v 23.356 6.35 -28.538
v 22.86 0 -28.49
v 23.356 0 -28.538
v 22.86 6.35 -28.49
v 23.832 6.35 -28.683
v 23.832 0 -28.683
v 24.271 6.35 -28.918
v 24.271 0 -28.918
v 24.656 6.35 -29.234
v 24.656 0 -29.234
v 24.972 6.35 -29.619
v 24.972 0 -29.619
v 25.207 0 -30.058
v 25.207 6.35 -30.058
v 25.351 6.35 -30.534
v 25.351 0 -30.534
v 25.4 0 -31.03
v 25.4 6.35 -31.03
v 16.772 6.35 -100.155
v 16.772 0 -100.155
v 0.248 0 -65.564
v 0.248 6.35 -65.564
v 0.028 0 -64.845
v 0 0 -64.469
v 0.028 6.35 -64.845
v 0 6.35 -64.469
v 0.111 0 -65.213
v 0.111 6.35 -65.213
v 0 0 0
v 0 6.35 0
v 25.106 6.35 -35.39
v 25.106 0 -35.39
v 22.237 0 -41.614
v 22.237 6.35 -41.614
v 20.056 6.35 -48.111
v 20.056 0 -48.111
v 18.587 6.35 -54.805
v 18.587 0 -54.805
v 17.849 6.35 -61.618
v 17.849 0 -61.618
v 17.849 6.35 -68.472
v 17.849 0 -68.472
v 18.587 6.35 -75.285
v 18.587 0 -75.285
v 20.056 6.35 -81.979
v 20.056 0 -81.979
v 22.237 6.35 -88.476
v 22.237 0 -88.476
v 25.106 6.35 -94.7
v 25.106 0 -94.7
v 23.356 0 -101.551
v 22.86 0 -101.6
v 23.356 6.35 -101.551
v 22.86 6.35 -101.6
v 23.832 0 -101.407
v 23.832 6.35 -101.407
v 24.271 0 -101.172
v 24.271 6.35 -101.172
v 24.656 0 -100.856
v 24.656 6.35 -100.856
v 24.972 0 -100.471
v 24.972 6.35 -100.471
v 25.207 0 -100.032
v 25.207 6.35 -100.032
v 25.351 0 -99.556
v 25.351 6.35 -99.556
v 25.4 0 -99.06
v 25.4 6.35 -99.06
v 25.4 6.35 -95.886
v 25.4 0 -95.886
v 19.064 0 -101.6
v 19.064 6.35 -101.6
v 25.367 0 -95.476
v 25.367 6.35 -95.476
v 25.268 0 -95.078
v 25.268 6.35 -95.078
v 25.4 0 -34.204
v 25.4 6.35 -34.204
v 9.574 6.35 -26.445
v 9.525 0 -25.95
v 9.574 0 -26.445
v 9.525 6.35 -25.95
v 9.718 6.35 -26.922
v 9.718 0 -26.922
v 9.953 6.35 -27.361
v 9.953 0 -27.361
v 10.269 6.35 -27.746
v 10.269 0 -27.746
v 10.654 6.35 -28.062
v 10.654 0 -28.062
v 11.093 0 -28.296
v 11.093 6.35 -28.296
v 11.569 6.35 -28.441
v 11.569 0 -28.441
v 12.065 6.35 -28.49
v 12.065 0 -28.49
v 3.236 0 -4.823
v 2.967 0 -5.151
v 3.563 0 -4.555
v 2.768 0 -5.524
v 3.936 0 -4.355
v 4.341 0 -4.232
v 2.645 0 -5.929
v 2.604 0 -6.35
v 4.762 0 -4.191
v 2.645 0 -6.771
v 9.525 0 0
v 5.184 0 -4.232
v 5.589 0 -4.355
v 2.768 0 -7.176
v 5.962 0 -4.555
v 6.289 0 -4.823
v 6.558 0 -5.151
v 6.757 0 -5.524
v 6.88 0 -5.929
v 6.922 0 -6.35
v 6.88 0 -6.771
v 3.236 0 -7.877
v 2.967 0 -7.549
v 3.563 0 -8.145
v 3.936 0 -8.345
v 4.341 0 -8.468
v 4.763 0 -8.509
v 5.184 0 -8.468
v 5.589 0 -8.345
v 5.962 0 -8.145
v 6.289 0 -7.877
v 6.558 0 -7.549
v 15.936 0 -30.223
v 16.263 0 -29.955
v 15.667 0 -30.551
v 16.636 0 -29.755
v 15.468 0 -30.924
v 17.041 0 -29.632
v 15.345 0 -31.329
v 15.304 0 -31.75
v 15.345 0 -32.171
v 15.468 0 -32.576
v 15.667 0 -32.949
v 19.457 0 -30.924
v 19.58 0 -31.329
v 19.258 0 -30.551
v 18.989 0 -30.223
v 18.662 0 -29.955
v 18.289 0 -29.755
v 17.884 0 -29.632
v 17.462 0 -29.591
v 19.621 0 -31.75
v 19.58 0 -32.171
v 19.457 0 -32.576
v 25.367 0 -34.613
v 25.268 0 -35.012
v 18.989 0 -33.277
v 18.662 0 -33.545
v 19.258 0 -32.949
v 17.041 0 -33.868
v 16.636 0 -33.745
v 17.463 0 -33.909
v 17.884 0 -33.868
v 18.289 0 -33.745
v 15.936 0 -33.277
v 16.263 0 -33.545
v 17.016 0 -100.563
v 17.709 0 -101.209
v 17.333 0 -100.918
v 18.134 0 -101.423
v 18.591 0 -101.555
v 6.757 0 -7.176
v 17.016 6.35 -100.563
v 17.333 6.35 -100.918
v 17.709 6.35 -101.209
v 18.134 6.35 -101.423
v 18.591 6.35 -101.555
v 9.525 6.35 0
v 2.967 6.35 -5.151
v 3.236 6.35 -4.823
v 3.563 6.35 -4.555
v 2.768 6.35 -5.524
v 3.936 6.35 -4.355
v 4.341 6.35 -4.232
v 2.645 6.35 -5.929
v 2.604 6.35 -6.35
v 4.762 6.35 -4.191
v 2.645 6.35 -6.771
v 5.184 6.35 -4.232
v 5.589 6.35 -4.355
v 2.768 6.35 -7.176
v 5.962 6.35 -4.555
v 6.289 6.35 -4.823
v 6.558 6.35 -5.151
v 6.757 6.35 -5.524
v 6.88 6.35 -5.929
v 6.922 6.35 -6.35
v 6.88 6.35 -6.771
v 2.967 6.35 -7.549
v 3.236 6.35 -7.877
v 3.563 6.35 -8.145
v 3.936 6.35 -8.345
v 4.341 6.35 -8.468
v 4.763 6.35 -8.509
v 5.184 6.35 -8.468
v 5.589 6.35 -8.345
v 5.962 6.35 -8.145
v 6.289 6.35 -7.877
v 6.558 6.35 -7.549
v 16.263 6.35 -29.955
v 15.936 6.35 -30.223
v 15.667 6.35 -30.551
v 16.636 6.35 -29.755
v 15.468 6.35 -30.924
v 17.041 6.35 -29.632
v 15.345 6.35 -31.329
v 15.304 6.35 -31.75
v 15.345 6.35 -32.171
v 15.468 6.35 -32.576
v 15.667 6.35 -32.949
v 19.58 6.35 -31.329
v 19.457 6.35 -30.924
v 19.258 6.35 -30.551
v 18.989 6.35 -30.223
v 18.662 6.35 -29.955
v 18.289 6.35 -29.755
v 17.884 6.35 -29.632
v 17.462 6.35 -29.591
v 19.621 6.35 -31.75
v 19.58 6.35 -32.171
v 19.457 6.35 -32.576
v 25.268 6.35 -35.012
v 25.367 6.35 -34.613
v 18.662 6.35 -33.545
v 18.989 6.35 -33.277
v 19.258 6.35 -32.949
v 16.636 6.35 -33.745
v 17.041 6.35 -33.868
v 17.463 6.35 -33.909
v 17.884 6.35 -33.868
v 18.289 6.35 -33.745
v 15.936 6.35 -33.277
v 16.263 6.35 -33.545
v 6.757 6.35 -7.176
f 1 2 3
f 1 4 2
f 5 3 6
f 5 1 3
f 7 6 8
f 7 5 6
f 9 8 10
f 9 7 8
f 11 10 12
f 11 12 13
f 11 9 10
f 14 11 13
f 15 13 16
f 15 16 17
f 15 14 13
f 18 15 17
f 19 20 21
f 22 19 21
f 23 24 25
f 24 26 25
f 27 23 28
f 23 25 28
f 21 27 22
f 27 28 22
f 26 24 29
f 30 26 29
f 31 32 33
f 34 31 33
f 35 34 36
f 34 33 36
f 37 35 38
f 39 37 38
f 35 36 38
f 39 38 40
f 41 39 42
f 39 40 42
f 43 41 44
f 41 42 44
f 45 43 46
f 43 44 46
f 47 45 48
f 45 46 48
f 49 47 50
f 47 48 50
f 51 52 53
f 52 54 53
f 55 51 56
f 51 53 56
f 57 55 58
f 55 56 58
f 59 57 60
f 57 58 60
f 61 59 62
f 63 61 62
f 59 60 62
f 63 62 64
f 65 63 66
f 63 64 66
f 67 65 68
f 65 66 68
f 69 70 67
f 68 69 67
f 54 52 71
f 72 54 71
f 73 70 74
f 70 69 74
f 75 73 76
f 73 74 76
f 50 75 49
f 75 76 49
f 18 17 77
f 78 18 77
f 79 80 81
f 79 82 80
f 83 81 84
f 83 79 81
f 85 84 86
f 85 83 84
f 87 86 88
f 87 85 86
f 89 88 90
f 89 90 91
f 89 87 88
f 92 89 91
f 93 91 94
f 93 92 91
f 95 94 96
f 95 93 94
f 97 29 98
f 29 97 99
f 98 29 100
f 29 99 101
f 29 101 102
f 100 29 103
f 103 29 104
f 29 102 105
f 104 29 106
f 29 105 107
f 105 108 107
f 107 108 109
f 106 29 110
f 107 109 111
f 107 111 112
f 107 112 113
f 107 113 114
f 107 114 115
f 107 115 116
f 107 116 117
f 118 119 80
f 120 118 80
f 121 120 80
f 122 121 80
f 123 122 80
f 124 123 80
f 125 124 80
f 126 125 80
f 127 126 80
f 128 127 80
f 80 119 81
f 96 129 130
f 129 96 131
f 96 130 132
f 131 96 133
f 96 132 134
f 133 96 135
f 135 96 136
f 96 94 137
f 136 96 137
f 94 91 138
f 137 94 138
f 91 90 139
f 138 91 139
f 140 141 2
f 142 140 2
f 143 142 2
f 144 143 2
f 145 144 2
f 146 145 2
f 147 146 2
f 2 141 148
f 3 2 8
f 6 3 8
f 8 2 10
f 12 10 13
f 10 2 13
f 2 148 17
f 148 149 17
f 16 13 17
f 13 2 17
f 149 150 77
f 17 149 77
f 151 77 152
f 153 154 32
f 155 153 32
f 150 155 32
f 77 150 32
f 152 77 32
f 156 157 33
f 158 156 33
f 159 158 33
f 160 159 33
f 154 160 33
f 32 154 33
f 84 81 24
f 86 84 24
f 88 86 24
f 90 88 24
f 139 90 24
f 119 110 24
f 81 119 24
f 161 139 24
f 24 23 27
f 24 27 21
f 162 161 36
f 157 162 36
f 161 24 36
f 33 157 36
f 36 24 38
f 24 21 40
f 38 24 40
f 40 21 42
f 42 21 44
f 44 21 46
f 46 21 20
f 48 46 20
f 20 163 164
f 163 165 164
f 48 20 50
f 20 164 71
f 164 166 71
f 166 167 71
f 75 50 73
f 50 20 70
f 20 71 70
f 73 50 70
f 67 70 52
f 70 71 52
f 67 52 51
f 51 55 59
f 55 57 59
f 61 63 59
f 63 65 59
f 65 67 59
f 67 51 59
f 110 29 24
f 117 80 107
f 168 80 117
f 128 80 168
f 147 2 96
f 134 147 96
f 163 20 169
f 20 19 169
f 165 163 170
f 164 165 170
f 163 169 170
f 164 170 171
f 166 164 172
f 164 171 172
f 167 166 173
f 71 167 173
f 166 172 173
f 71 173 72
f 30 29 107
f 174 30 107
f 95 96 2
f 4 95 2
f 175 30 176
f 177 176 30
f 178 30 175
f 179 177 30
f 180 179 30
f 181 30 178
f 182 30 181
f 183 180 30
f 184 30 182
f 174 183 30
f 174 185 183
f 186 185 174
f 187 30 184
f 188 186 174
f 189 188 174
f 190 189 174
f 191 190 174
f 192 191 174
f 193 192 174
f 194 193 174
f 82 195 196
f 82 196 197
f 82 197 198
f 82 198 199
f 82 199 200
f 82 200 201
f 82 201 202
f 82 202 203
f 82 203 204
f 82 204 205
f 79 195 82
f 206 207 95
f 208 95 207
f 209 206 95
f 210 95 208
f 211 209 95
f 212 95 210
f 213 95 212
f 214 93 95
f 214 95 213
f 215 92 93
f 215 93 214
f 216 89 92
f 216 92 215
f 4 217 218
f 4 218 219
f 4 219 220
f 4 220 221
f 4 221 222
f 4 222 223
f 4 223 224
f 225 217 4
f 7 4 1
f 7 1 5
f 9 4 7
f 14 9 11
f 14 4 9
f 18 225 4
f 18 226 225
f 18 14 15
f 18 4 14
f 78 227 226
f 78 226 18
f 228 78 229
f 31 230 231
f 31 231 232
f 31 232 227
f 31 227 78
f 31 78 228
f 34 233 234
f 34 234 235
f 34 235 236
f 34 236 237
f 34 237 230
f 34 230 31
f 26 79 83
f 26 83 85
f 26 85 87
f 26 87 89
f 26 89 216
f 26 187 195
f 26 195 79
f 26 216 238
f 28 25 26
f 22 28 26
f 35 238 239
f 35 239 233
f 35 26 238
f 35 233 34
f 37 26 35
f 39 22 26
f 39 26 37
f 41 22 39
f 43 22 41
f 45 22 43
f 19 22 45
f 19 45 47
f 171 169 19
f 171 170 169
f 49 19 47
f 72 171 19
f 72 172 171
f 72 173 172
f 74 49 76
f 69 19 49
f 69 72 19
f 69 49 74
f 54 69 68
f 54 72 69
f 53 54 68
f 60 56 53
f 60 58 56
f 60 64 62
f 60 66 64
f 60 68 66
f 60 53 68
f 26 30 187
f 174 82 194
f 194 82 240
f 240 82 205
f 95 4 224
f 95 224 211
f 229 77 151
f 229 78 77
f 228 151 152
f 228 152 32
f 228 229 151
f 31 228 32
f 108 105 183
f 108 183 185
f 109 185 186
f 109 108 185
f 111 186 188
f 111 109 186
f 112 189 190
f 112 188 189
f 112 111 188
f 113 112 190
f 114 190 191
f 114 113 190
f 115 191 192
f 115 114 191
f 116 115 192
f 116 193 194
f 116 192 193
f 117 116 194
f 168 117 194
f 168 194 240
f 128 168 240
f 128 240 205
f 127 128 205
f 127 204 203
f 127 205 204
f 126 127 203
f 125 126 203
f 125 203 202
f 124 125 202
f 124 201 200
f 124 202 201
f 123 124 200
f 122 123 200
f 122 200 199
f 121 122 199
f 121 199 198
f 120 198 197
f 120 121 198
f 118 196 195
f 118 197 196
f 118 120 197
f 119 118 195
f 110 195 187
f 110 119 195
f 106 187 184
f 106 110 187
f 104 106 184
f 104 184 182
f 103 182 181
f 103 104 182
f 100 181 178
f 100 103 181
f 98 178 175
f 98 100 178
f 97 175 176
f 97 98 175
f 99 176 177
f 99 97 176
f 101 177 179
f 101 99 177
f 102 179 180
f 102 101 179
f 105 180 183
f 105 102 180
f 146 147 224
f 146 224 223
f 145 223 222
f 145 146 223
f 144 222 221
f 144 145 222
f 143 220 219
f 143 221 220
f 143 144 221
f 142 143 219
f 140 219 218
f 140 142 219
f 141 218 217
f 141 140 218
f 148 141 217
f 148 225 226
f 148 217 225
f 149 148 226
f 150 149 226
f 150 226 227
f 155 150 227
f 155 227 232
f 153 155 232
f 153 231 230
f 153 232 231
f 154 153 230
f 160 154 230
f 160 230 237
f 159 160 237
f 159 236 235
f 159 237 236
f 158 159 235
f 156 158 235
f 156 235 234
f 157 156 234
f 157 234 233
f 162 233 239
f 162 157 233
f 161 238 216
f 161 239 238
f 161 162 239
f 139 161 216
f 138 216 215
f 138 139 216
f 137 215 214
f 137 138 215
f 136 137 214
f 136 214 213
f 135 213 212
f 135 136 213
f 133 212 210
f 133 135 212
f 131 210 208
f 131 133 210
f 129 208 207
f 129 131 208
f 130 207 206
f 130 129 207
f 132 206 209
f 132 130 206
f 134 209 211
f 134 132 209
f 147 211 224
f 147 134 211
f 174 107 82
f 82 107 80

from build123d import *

# Parameters (mm, degrees)
BOSS_EXTRUDE1_DEPTH     = 6.35
CUT_EXTRUDE2_DEPTH      = 105.775
CUT_EXTRUDE2_DEPTH_BACK = 105.775
SKETCH5_R               = 2.159
FILLET1_R               = 2.54


with BuildPart() as part:
    # Sketch1 → Boss-Extrude1 (new body)
    with BuildSketch(Plane(origin=(0, 0, 0), x_dir=(1, 0, 0), z_dir=(0, 1, 0))):
        with BuildLine():
            Line((0, 0), (9.525, 0))
            Line((9.525, 0), (9.525, 28.48967645))
            Line((9.525, 28.48967645), (25.4, 28.48967645))
            Line((25.4, 28.48967645), (25.4, 34.83967645))
            ThreePointArc((25.4, 34.83967645), (17.756048931, 65.044838225), (25.4, 95.25))
            Line((25.4, 95.25), (25.4, 101.6))
            Line((25.4, 101.6), (17.4625, 101.6))
            Line((17.4625, 101.6), (0, 65.044838225))
            Line((0, 65.044838225), (0, 0))
        make_face()
    extrude(amount=BOSS_EXTRUDE1_DEPTH)

    # Sketch5 → Cut-Extrude2 (cut, two sides: drawn at the far end of the back side and taken through both)
    with BuildSketch(Plane(origin=(0, 3.175, 0), x_dir=(1, 0, 0), z_dir=(0, 1, 0)).offset(-CUT_EXTRUDE2_DEPTH_BACK)):
        with Locations(Location((17.4625, 31.75, 0), (0, 0, 270))):
            Circle(SKETCH5_R)
        with Locations(Location((4.7625, 6.35, 0), (0, 0, 270))):
            Circle(SKETCH5_R)
    extrude(amount=CUT_EXTRUDE2_DEPTH + CUT_EXTRUDE2_DEPTH_BACK, mode=Mode.SUBTRACT)

    # Fillet1
    fillet1_edges = [part.edges().sort_by_distance(p)[0] for p in [
        (0, 3.175, -65.044838225),
        (17.4625, 3.175, -101.6),
        (25.4, 3.175, -101.6),
        (25.4, 3.175, -95.25),
        (25.4, 3.175, -34.83967645),
        (25.4, 3.175, -28.48967645),
        (9.525, 3.175, -28.48967645),
    ]]
    fillet(fillet1_edges, radius=FILLET1_R)


solid = part.part
